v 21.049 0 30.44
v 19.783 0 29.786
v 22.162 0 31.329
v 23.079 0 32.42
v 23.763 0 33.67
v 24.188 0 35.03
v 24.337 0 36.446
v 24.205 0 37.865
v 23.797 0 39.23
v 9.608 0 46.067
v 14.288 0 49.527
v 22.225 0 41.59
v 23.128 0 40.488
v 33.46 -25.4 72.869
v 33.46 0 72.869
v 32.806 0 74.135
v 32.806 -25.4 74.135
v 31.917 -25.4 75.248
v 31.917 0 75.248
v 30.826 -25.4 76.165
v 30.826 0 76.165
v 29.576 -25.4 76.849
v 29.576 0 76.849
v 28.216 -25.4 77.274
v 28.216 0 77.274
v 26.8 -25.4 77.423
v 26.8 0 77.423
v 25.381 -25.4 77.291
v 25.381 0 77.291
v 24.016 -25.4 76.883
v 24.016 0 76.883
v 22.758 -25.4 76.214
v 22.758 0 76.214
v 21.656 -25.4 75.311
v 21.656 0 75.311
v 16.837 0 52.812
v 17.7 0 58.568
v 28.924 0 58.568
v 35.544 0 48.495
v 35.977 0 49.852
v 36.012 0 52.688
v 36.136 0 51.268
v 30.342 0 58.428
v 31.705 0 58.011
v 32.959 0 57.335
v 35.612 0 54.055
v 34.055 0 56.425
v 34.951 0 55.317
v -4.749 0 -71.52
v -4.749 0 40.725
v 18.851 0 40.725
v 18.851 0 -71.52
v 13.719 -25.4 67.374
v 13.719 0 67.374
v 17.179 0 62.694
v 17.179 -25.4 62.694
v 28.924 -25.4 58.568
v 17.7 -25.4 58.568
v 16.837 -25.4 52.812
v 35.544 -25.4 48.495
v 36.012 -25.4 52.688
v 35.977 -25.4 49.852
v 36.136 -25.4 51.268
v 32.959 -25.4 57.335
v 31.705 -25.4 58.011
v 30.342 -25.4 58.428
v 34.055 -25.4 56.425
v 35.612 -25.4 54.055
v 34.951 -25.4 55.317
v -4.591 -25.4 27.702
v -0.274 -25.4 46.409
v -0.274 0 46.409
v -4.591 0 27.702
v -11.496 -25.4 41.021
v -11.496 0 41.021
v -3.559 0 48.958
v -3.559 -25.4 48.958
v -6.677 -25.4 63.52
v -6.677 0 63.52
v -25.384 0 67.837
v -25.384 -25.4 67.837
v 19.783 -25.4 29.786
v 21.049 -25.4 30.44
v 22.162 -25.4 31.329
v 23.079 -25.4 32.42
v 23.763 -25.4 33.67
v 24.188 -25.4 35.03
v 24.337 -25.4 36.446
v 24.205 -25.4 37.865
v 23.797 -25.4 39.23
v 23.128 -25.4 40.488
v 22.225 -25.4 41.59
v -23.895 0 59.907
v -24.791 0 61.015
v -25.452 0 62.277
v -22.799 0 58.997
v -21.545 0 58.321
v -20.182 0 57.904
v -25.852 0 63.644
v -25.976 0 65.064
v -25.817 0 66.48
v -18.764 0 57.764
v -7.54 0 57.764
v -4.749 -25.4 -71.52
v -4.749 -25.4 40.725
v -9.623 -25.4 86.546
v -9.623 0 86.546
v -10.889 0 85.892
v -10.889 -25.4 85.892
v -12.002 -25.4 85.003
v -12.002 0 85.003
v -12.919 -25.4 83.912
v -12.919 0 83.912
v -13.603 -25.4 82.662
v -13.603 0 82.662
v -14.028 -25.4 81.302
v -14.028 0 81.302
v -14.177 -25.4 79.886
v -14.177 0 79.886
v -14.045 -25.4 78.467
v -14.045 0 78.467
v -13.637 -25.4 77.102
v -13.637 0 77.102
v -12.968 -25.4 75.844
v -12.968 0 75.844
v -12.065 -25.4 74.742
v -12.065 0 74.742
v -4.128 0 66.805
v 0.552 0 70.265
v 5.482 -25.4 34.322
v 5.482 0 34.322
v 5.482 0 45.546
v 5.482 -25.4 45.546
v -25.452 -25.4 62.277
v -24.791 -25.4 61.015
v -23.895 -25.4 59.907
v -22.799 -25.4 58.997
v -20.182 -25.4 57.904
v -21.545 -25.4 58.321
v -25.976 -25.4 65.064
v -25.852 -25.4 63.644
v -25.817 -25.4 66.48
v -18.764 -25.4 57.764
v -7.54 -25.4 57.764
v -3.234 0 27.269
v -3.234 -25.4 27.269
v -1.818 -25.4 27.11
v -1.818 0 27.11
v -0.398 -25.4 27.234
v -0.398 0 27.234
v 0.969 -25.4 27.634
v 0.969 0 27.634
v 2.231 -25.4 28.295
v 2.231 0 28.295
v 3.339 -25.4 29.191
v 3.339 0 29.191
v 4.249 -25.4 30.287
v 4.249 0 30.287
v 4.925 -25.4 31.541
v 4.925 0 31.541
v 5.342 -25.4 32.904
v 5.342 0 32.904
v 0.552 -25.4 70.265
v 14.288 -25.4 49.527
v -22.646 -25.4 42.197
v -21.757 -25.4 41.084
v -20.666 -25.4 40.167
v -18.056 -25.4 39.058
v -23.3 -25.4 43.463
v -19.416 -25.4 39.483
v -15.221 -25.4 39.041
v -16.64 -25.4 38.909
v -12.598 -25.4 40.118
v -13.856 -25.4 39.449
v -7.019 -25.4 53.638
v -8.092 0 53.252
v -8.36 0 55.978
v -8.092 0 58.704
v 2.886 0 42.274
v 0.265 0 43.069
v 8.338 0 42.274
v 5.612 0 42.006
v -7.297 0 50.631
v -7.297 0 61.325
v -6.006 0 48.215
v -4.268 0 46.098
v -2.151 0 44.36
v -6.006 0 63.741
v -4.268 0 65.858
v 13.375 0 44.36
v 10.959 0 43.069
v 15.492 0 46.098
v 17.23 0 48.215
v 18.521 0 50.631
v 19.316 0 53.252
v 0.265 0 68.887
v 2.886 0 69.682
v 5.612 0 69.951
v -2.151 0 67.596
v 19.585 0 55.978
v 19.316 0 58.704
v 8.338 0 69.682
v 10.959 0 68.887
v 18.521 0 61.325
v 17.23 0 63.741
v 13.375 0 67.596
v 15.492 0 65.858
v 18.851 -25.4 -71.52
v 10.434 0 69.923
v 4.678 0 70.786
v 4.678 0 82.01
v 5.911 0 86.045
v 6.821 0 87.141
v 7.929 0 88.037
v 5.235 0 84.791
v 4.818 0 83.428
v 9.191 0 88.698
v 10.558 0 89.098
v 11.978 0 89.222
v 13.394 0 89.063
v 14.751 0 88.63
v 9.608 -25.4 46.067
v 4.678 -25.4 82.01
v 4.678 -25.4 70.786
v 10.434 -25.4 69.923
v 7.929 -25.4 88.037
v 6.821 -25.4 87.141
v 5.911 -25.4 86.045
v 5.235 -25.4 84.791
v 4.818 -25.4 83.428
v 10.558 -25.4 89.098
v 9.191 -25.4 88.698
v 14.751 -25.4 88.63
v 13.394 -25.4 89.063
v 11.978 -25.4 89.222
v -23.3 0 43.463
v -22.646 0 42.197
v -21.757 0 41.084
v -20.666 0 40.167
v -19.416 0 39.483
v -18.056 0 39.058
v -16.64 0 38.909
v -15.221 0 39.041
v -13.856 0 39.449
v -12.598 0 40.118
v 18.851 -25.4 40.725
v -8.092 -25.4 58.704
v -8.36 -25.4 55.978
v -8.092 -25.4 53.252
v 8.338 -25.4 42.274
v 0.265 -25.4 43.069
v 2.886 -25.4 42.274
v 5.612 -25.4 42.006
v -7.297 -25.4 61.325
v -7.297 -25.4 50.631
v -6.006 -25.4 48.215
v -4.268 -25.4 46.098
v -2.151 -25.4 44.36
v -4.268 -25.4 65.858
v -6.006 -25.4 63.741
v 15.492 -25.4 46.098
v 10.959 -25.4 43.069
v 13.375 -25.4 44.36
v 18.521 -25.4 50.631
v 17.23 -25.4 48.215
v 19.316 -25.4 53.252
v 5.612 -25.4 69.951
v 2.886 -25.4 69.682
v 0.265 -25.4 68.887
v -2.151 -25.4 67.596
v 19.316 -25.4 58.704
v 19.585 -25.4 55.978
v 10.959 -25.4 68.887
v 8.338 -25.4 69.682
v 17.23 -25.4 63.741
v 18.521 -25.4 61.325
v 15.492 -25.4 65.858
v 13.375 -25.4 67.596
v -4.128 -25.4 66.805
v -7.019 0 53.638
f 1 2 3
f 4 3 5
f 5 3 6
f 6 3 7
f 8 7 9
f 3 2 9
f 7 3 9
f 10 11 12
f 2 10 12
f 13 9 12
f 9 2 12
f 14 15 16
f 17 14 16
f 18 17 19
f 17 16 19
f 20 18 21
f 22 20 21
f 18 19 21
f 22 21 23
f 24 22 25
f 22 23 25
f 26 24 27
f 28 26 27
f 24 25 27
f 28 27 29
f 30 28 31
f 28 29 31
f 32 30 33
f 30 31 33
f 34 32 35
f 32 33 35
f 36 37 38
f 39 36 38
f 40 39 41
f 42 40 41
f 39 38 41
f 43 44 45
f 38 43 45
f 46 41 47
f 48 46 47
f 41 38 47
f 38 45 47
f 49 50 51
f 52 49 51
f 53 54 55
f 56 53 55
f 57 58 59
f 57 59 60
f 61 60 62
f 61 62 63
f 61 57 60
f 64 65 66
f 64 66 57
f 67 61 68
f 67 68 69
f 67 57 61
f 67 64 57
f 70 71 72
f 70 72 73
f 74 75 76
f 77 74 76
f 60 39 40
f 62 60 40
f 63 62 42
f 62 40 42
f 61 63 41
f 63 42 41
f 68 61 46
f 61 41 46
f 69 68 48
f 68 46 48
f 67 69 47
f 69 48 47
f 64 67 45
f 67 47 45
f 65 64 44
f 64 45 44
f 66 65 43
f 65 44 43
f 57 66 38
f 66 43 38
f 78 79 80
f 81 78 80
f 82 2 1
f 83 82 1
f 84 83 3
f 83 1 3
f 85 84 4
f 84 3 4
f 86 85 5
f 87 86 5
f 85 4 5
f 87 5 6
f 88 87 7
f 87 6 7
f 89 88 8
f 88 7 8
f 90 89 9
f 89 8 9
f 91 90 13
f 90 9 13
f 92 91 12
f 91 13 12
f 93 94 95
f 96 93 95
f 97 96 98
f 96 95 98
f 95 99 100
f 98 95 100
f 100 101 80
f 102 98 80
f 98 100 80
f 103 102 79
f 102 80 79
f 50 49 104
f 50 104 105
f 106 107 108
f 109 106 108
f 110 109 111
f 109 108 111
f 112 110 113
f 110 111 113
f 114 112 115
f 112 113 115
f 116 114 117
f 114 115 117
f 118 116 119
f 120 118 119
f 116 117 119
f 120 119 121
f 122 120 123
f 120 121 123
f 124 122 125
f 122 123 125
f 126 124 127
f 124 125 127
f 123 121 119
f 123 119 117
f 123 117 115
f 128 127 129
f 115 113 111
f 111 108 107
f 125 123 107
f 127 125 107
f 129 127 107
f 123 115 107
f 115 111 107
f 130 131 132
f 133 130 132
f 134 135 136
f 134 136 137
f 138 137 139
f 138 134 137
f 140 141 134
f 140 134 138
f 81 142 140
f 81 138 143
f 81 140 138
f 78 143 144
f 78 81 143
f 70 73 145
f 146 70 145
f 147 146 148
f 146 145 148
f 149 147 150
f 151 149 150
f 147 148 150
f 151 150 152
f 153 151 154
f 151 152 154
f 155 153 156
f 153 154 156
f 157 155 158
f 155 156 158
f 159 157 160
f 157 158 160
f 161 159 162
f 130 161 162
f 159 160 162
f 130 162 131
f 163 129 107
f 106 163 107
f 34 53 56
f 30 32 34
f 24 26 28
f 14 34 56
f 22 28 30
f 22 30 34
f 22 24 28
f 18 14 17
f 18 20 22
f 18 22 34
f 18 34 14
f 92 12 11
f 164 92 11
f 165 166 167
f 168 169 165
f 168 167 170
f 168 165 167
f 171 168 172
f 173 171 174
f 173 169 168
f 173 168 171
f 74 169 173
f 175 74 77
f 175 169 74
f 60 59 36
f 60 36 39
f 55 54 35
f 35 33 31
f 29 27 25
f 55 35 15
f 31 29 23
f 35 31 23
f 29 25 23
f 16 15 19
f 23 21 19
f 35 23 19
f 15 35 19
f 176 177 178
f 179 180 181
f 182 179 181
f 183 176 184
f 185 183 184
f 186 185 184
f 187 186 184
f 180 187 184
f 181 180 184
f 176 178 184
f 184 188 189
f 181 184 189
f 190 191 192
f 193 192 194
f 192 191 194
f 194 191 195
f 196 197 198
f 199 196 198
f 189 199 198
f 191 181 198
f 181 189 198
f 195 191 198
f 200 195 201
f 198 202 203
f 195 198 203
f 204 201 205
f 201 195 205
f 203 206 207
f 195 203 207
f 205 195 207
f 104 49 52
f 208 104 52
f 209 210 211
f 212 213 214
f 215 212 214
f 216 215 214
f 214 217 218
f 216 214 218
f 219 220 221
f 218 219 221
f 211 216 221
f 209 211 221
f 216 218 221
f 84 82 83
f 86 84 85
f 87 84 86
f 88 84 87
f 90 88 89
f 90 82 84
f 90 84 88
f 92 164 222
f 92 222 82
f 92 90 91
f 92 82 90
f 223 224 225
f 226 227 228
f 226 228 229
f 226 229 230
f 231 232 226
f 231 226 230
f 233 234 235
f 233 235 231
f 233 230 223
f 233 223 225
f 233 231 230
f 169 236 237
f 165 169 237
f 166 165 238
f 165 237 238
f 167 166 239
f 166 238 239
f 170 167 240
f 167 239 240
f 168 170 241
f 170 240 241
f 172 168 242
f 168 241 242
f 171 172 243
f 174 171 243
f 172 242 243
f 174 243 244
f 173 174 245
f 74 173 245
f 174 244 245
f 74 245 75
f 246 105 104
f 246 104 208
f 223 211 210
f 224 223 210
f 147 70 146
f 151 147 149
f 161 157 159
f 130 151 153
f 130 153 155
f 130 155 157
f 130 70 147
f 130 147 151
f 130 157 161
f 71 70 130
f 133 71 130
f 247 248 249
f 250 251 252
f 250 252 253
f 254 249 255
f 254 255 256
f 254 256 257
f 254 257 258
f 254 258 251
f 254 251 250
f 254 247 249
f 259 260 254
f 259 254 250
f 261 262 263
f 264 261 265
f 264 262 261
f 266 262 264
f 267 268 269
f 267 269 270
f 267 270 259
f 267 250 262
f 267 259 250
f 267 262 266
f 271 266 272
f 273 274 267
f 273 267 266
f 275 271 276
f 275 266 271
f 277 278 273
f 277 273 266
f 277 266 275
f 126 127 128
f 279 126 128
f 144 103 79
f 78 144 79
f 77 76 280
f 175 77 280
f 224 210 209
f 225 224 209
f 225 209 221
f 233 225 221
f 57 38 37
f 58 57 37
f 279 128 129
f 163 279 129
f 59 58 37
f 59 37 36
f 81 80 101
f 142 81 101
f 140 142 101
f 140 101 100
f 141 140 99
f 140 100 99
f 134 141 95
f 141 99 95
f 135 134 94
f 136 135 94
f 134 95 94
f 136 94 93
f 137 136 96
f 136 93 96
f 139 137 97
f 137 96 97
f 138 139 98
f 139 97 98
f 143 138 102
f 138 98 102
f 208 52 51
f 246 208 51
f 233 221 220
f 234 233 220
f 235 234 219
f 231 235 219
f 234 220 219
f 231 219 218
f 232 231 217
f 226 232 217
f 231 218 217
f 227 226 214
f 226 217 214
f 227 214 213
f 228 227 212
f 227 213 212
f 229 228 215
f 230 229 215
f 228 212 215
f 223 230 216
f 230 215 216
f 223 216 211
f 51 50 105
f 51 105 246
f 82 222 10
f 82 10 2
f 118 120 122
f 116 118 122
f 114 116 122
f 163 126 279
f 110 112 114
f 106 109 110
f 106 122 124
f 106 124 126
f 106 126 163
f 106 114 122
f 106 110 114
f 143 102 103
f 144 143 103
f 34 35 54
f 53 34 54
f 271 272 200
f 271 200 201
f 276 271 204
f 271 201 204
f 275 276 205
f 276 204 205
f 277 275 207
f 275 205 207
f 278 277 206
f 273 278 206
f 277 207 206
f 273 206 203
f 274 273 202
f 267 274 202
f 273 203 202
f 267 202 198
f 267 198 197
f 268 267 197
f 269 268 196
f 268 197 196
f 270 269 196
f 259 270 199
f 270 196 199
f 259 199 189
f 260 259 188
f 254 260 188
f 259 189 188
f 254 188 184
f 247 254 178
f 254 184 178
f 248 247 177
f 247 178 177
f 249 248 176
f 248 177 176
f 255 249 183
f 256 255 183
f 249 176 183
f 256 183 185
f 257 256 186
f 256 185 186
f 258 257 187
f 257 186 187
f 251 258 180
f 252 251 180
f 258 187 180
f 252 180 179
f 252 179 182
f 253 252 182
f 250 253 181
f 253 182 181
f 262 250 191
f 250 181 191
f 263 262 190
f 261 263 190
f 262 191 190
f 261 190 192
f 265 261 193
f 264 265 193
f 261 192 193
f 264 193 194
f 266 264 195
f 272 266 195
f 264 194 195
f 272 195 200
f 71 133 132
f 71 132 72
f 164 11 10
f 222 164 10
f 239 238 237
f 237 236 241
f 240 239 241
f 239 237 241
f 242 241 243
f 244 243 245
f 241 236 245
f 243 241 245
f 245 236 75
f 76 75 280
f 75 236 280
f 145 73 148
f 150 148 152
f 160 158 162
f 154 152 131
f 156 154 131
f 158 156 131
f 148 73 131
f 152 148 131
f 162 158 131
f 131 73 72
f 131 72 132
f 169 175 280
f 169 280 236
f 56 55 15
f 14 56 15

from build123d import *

# Parameters (mm, degrees)
F0_W     = 23.600073
F0_H     = 112.244244
F1_DEPTH = 25.4
F2_R     = 13.972665
F3_DEPTH = 25.4
F5_DEPTH = 25.4


with BuildPart() as f1:
    # F0 (on Front) → F1 (new body)
    with BuildSketch(Plane.XZ):
        with Locations((7.051242, -15.39761)):
            Rectangle(F0_W, F0_H)
    extrude(amount=F1_DEPTH)


with BuildPart() as f3:
    # F2 (on Front) → F3 (new body)
    with BuildSketch(Plane.XZ):
        with Locations((5.612213, 55.97822)):
            Circle(F2_R)
    extrude(amount=F3_DEPTH)


with BuildPart() as f5:
    # F4 (on Front) → F5 (new body)
    with BuildSketch(Plane.XZ):
        with BuildLine():
            Line((-3.559135, 48.957681), (-7.018793, 53.638397))
            Line((-7.018793, 53.638397), (-23.299548, 43.462929))
            ThreePointArc((-23.299548, 43.462929), (-18.056473, 39.058156), (-11.495999, 41.020817))
            Line((-11.495999, 41.020817), (-3.559135, 48.957681))
        make_face()
        with BuildLine():
            Line((-7.540056, 57.763526), (-6.676638, 63.51964))
            Line((-6.676638, 63.51964), (-25.384012, 67.83673))
            ThreePointArc((-25.384012, 67.83673), (-24.791243, 61.014671), (-18.764476, 57.763526))
            Line((-18.764476, 57.763526), (-7.540056, 57.763526))
        make_face()
        with BuildLine():
            Line((-4.128319, 66.805135), (0.552397, 70.264793))
            Line((0.552397, 70.264793), (-9.623071, 86.545548))
            ThreePointArc((-9.623071, 86.545548), (-14.027844, 81.302473), (-12.065183, 74.741999))
            Line((-12.065183, 74.741999), (-4.128319, 66.805135))
        make_face()
        with BuildLine():
            Line((4.677526, 70.786056), (10.43364, 69.922638))
            Line((10.43364, 69.922638), (14.75073, 88.630012))
            ThreePointArc((14.75073, 88.630012), (7.928671, 88.037243), (4.677526, 82.010476))
            Line((4.677526, 82.010476), (4.677526, 70.786056))
        make_face()
        with BuildLine():
            Line((13.719135, 67.374319), (17.178793, 62.693603))
            Line((17.178793, 62.693603), (33.459548, 72.869071))
            ThreePointArc((33.459548, 72.869071), (28.216473, 77.273844), (21.655999, 75.311183))
            Line((21.655999, 75.311183), (13.719135, 67.374319))
        make_face()
        with BuildLine():
            Line((17.700056, 58.568474), (16.836638, 52.81236))
            Line((16.836638, 52.81236), (35.544012, 48.49527))
            ThreePointArc((35.544012, 48.49527), (34.951243, 55.317329), (28.924476, 58.568474))
            Line((28.924476, 58.568474), (17.700056, 58.568474))
        make_face()
        with BuildLine():
            Line((14.288319, 49.526865), (9.607603, 46.067207))
            Line((9.607603, 46.067207), (19.783071, 29.786452))
            ThreePointArc((19.783071, 29.786452), (24.187844, 35.029527), (22.225183, 41.590001))
            Line((22.225183, 41.590001), (14.288319, 49.526865))
        make_face()
        with BuildLine():
            Line((5.482474, 45.545944), (-0.27364, 46.409362))
            Line((-0.27364, 46.409362), (-4.59073, 27.701988))
            ThreePointArc((-4.59073, 27.701988), (2.231329, 28.294757), (5.482474, 34.321524))
            Line((5.482474, 34.321524), (5.482474, 45.545944))
        make_face()
    extrude(amount=F5_DEPTH)


solid = Compound([f1.part, f3.part, f5.part])
